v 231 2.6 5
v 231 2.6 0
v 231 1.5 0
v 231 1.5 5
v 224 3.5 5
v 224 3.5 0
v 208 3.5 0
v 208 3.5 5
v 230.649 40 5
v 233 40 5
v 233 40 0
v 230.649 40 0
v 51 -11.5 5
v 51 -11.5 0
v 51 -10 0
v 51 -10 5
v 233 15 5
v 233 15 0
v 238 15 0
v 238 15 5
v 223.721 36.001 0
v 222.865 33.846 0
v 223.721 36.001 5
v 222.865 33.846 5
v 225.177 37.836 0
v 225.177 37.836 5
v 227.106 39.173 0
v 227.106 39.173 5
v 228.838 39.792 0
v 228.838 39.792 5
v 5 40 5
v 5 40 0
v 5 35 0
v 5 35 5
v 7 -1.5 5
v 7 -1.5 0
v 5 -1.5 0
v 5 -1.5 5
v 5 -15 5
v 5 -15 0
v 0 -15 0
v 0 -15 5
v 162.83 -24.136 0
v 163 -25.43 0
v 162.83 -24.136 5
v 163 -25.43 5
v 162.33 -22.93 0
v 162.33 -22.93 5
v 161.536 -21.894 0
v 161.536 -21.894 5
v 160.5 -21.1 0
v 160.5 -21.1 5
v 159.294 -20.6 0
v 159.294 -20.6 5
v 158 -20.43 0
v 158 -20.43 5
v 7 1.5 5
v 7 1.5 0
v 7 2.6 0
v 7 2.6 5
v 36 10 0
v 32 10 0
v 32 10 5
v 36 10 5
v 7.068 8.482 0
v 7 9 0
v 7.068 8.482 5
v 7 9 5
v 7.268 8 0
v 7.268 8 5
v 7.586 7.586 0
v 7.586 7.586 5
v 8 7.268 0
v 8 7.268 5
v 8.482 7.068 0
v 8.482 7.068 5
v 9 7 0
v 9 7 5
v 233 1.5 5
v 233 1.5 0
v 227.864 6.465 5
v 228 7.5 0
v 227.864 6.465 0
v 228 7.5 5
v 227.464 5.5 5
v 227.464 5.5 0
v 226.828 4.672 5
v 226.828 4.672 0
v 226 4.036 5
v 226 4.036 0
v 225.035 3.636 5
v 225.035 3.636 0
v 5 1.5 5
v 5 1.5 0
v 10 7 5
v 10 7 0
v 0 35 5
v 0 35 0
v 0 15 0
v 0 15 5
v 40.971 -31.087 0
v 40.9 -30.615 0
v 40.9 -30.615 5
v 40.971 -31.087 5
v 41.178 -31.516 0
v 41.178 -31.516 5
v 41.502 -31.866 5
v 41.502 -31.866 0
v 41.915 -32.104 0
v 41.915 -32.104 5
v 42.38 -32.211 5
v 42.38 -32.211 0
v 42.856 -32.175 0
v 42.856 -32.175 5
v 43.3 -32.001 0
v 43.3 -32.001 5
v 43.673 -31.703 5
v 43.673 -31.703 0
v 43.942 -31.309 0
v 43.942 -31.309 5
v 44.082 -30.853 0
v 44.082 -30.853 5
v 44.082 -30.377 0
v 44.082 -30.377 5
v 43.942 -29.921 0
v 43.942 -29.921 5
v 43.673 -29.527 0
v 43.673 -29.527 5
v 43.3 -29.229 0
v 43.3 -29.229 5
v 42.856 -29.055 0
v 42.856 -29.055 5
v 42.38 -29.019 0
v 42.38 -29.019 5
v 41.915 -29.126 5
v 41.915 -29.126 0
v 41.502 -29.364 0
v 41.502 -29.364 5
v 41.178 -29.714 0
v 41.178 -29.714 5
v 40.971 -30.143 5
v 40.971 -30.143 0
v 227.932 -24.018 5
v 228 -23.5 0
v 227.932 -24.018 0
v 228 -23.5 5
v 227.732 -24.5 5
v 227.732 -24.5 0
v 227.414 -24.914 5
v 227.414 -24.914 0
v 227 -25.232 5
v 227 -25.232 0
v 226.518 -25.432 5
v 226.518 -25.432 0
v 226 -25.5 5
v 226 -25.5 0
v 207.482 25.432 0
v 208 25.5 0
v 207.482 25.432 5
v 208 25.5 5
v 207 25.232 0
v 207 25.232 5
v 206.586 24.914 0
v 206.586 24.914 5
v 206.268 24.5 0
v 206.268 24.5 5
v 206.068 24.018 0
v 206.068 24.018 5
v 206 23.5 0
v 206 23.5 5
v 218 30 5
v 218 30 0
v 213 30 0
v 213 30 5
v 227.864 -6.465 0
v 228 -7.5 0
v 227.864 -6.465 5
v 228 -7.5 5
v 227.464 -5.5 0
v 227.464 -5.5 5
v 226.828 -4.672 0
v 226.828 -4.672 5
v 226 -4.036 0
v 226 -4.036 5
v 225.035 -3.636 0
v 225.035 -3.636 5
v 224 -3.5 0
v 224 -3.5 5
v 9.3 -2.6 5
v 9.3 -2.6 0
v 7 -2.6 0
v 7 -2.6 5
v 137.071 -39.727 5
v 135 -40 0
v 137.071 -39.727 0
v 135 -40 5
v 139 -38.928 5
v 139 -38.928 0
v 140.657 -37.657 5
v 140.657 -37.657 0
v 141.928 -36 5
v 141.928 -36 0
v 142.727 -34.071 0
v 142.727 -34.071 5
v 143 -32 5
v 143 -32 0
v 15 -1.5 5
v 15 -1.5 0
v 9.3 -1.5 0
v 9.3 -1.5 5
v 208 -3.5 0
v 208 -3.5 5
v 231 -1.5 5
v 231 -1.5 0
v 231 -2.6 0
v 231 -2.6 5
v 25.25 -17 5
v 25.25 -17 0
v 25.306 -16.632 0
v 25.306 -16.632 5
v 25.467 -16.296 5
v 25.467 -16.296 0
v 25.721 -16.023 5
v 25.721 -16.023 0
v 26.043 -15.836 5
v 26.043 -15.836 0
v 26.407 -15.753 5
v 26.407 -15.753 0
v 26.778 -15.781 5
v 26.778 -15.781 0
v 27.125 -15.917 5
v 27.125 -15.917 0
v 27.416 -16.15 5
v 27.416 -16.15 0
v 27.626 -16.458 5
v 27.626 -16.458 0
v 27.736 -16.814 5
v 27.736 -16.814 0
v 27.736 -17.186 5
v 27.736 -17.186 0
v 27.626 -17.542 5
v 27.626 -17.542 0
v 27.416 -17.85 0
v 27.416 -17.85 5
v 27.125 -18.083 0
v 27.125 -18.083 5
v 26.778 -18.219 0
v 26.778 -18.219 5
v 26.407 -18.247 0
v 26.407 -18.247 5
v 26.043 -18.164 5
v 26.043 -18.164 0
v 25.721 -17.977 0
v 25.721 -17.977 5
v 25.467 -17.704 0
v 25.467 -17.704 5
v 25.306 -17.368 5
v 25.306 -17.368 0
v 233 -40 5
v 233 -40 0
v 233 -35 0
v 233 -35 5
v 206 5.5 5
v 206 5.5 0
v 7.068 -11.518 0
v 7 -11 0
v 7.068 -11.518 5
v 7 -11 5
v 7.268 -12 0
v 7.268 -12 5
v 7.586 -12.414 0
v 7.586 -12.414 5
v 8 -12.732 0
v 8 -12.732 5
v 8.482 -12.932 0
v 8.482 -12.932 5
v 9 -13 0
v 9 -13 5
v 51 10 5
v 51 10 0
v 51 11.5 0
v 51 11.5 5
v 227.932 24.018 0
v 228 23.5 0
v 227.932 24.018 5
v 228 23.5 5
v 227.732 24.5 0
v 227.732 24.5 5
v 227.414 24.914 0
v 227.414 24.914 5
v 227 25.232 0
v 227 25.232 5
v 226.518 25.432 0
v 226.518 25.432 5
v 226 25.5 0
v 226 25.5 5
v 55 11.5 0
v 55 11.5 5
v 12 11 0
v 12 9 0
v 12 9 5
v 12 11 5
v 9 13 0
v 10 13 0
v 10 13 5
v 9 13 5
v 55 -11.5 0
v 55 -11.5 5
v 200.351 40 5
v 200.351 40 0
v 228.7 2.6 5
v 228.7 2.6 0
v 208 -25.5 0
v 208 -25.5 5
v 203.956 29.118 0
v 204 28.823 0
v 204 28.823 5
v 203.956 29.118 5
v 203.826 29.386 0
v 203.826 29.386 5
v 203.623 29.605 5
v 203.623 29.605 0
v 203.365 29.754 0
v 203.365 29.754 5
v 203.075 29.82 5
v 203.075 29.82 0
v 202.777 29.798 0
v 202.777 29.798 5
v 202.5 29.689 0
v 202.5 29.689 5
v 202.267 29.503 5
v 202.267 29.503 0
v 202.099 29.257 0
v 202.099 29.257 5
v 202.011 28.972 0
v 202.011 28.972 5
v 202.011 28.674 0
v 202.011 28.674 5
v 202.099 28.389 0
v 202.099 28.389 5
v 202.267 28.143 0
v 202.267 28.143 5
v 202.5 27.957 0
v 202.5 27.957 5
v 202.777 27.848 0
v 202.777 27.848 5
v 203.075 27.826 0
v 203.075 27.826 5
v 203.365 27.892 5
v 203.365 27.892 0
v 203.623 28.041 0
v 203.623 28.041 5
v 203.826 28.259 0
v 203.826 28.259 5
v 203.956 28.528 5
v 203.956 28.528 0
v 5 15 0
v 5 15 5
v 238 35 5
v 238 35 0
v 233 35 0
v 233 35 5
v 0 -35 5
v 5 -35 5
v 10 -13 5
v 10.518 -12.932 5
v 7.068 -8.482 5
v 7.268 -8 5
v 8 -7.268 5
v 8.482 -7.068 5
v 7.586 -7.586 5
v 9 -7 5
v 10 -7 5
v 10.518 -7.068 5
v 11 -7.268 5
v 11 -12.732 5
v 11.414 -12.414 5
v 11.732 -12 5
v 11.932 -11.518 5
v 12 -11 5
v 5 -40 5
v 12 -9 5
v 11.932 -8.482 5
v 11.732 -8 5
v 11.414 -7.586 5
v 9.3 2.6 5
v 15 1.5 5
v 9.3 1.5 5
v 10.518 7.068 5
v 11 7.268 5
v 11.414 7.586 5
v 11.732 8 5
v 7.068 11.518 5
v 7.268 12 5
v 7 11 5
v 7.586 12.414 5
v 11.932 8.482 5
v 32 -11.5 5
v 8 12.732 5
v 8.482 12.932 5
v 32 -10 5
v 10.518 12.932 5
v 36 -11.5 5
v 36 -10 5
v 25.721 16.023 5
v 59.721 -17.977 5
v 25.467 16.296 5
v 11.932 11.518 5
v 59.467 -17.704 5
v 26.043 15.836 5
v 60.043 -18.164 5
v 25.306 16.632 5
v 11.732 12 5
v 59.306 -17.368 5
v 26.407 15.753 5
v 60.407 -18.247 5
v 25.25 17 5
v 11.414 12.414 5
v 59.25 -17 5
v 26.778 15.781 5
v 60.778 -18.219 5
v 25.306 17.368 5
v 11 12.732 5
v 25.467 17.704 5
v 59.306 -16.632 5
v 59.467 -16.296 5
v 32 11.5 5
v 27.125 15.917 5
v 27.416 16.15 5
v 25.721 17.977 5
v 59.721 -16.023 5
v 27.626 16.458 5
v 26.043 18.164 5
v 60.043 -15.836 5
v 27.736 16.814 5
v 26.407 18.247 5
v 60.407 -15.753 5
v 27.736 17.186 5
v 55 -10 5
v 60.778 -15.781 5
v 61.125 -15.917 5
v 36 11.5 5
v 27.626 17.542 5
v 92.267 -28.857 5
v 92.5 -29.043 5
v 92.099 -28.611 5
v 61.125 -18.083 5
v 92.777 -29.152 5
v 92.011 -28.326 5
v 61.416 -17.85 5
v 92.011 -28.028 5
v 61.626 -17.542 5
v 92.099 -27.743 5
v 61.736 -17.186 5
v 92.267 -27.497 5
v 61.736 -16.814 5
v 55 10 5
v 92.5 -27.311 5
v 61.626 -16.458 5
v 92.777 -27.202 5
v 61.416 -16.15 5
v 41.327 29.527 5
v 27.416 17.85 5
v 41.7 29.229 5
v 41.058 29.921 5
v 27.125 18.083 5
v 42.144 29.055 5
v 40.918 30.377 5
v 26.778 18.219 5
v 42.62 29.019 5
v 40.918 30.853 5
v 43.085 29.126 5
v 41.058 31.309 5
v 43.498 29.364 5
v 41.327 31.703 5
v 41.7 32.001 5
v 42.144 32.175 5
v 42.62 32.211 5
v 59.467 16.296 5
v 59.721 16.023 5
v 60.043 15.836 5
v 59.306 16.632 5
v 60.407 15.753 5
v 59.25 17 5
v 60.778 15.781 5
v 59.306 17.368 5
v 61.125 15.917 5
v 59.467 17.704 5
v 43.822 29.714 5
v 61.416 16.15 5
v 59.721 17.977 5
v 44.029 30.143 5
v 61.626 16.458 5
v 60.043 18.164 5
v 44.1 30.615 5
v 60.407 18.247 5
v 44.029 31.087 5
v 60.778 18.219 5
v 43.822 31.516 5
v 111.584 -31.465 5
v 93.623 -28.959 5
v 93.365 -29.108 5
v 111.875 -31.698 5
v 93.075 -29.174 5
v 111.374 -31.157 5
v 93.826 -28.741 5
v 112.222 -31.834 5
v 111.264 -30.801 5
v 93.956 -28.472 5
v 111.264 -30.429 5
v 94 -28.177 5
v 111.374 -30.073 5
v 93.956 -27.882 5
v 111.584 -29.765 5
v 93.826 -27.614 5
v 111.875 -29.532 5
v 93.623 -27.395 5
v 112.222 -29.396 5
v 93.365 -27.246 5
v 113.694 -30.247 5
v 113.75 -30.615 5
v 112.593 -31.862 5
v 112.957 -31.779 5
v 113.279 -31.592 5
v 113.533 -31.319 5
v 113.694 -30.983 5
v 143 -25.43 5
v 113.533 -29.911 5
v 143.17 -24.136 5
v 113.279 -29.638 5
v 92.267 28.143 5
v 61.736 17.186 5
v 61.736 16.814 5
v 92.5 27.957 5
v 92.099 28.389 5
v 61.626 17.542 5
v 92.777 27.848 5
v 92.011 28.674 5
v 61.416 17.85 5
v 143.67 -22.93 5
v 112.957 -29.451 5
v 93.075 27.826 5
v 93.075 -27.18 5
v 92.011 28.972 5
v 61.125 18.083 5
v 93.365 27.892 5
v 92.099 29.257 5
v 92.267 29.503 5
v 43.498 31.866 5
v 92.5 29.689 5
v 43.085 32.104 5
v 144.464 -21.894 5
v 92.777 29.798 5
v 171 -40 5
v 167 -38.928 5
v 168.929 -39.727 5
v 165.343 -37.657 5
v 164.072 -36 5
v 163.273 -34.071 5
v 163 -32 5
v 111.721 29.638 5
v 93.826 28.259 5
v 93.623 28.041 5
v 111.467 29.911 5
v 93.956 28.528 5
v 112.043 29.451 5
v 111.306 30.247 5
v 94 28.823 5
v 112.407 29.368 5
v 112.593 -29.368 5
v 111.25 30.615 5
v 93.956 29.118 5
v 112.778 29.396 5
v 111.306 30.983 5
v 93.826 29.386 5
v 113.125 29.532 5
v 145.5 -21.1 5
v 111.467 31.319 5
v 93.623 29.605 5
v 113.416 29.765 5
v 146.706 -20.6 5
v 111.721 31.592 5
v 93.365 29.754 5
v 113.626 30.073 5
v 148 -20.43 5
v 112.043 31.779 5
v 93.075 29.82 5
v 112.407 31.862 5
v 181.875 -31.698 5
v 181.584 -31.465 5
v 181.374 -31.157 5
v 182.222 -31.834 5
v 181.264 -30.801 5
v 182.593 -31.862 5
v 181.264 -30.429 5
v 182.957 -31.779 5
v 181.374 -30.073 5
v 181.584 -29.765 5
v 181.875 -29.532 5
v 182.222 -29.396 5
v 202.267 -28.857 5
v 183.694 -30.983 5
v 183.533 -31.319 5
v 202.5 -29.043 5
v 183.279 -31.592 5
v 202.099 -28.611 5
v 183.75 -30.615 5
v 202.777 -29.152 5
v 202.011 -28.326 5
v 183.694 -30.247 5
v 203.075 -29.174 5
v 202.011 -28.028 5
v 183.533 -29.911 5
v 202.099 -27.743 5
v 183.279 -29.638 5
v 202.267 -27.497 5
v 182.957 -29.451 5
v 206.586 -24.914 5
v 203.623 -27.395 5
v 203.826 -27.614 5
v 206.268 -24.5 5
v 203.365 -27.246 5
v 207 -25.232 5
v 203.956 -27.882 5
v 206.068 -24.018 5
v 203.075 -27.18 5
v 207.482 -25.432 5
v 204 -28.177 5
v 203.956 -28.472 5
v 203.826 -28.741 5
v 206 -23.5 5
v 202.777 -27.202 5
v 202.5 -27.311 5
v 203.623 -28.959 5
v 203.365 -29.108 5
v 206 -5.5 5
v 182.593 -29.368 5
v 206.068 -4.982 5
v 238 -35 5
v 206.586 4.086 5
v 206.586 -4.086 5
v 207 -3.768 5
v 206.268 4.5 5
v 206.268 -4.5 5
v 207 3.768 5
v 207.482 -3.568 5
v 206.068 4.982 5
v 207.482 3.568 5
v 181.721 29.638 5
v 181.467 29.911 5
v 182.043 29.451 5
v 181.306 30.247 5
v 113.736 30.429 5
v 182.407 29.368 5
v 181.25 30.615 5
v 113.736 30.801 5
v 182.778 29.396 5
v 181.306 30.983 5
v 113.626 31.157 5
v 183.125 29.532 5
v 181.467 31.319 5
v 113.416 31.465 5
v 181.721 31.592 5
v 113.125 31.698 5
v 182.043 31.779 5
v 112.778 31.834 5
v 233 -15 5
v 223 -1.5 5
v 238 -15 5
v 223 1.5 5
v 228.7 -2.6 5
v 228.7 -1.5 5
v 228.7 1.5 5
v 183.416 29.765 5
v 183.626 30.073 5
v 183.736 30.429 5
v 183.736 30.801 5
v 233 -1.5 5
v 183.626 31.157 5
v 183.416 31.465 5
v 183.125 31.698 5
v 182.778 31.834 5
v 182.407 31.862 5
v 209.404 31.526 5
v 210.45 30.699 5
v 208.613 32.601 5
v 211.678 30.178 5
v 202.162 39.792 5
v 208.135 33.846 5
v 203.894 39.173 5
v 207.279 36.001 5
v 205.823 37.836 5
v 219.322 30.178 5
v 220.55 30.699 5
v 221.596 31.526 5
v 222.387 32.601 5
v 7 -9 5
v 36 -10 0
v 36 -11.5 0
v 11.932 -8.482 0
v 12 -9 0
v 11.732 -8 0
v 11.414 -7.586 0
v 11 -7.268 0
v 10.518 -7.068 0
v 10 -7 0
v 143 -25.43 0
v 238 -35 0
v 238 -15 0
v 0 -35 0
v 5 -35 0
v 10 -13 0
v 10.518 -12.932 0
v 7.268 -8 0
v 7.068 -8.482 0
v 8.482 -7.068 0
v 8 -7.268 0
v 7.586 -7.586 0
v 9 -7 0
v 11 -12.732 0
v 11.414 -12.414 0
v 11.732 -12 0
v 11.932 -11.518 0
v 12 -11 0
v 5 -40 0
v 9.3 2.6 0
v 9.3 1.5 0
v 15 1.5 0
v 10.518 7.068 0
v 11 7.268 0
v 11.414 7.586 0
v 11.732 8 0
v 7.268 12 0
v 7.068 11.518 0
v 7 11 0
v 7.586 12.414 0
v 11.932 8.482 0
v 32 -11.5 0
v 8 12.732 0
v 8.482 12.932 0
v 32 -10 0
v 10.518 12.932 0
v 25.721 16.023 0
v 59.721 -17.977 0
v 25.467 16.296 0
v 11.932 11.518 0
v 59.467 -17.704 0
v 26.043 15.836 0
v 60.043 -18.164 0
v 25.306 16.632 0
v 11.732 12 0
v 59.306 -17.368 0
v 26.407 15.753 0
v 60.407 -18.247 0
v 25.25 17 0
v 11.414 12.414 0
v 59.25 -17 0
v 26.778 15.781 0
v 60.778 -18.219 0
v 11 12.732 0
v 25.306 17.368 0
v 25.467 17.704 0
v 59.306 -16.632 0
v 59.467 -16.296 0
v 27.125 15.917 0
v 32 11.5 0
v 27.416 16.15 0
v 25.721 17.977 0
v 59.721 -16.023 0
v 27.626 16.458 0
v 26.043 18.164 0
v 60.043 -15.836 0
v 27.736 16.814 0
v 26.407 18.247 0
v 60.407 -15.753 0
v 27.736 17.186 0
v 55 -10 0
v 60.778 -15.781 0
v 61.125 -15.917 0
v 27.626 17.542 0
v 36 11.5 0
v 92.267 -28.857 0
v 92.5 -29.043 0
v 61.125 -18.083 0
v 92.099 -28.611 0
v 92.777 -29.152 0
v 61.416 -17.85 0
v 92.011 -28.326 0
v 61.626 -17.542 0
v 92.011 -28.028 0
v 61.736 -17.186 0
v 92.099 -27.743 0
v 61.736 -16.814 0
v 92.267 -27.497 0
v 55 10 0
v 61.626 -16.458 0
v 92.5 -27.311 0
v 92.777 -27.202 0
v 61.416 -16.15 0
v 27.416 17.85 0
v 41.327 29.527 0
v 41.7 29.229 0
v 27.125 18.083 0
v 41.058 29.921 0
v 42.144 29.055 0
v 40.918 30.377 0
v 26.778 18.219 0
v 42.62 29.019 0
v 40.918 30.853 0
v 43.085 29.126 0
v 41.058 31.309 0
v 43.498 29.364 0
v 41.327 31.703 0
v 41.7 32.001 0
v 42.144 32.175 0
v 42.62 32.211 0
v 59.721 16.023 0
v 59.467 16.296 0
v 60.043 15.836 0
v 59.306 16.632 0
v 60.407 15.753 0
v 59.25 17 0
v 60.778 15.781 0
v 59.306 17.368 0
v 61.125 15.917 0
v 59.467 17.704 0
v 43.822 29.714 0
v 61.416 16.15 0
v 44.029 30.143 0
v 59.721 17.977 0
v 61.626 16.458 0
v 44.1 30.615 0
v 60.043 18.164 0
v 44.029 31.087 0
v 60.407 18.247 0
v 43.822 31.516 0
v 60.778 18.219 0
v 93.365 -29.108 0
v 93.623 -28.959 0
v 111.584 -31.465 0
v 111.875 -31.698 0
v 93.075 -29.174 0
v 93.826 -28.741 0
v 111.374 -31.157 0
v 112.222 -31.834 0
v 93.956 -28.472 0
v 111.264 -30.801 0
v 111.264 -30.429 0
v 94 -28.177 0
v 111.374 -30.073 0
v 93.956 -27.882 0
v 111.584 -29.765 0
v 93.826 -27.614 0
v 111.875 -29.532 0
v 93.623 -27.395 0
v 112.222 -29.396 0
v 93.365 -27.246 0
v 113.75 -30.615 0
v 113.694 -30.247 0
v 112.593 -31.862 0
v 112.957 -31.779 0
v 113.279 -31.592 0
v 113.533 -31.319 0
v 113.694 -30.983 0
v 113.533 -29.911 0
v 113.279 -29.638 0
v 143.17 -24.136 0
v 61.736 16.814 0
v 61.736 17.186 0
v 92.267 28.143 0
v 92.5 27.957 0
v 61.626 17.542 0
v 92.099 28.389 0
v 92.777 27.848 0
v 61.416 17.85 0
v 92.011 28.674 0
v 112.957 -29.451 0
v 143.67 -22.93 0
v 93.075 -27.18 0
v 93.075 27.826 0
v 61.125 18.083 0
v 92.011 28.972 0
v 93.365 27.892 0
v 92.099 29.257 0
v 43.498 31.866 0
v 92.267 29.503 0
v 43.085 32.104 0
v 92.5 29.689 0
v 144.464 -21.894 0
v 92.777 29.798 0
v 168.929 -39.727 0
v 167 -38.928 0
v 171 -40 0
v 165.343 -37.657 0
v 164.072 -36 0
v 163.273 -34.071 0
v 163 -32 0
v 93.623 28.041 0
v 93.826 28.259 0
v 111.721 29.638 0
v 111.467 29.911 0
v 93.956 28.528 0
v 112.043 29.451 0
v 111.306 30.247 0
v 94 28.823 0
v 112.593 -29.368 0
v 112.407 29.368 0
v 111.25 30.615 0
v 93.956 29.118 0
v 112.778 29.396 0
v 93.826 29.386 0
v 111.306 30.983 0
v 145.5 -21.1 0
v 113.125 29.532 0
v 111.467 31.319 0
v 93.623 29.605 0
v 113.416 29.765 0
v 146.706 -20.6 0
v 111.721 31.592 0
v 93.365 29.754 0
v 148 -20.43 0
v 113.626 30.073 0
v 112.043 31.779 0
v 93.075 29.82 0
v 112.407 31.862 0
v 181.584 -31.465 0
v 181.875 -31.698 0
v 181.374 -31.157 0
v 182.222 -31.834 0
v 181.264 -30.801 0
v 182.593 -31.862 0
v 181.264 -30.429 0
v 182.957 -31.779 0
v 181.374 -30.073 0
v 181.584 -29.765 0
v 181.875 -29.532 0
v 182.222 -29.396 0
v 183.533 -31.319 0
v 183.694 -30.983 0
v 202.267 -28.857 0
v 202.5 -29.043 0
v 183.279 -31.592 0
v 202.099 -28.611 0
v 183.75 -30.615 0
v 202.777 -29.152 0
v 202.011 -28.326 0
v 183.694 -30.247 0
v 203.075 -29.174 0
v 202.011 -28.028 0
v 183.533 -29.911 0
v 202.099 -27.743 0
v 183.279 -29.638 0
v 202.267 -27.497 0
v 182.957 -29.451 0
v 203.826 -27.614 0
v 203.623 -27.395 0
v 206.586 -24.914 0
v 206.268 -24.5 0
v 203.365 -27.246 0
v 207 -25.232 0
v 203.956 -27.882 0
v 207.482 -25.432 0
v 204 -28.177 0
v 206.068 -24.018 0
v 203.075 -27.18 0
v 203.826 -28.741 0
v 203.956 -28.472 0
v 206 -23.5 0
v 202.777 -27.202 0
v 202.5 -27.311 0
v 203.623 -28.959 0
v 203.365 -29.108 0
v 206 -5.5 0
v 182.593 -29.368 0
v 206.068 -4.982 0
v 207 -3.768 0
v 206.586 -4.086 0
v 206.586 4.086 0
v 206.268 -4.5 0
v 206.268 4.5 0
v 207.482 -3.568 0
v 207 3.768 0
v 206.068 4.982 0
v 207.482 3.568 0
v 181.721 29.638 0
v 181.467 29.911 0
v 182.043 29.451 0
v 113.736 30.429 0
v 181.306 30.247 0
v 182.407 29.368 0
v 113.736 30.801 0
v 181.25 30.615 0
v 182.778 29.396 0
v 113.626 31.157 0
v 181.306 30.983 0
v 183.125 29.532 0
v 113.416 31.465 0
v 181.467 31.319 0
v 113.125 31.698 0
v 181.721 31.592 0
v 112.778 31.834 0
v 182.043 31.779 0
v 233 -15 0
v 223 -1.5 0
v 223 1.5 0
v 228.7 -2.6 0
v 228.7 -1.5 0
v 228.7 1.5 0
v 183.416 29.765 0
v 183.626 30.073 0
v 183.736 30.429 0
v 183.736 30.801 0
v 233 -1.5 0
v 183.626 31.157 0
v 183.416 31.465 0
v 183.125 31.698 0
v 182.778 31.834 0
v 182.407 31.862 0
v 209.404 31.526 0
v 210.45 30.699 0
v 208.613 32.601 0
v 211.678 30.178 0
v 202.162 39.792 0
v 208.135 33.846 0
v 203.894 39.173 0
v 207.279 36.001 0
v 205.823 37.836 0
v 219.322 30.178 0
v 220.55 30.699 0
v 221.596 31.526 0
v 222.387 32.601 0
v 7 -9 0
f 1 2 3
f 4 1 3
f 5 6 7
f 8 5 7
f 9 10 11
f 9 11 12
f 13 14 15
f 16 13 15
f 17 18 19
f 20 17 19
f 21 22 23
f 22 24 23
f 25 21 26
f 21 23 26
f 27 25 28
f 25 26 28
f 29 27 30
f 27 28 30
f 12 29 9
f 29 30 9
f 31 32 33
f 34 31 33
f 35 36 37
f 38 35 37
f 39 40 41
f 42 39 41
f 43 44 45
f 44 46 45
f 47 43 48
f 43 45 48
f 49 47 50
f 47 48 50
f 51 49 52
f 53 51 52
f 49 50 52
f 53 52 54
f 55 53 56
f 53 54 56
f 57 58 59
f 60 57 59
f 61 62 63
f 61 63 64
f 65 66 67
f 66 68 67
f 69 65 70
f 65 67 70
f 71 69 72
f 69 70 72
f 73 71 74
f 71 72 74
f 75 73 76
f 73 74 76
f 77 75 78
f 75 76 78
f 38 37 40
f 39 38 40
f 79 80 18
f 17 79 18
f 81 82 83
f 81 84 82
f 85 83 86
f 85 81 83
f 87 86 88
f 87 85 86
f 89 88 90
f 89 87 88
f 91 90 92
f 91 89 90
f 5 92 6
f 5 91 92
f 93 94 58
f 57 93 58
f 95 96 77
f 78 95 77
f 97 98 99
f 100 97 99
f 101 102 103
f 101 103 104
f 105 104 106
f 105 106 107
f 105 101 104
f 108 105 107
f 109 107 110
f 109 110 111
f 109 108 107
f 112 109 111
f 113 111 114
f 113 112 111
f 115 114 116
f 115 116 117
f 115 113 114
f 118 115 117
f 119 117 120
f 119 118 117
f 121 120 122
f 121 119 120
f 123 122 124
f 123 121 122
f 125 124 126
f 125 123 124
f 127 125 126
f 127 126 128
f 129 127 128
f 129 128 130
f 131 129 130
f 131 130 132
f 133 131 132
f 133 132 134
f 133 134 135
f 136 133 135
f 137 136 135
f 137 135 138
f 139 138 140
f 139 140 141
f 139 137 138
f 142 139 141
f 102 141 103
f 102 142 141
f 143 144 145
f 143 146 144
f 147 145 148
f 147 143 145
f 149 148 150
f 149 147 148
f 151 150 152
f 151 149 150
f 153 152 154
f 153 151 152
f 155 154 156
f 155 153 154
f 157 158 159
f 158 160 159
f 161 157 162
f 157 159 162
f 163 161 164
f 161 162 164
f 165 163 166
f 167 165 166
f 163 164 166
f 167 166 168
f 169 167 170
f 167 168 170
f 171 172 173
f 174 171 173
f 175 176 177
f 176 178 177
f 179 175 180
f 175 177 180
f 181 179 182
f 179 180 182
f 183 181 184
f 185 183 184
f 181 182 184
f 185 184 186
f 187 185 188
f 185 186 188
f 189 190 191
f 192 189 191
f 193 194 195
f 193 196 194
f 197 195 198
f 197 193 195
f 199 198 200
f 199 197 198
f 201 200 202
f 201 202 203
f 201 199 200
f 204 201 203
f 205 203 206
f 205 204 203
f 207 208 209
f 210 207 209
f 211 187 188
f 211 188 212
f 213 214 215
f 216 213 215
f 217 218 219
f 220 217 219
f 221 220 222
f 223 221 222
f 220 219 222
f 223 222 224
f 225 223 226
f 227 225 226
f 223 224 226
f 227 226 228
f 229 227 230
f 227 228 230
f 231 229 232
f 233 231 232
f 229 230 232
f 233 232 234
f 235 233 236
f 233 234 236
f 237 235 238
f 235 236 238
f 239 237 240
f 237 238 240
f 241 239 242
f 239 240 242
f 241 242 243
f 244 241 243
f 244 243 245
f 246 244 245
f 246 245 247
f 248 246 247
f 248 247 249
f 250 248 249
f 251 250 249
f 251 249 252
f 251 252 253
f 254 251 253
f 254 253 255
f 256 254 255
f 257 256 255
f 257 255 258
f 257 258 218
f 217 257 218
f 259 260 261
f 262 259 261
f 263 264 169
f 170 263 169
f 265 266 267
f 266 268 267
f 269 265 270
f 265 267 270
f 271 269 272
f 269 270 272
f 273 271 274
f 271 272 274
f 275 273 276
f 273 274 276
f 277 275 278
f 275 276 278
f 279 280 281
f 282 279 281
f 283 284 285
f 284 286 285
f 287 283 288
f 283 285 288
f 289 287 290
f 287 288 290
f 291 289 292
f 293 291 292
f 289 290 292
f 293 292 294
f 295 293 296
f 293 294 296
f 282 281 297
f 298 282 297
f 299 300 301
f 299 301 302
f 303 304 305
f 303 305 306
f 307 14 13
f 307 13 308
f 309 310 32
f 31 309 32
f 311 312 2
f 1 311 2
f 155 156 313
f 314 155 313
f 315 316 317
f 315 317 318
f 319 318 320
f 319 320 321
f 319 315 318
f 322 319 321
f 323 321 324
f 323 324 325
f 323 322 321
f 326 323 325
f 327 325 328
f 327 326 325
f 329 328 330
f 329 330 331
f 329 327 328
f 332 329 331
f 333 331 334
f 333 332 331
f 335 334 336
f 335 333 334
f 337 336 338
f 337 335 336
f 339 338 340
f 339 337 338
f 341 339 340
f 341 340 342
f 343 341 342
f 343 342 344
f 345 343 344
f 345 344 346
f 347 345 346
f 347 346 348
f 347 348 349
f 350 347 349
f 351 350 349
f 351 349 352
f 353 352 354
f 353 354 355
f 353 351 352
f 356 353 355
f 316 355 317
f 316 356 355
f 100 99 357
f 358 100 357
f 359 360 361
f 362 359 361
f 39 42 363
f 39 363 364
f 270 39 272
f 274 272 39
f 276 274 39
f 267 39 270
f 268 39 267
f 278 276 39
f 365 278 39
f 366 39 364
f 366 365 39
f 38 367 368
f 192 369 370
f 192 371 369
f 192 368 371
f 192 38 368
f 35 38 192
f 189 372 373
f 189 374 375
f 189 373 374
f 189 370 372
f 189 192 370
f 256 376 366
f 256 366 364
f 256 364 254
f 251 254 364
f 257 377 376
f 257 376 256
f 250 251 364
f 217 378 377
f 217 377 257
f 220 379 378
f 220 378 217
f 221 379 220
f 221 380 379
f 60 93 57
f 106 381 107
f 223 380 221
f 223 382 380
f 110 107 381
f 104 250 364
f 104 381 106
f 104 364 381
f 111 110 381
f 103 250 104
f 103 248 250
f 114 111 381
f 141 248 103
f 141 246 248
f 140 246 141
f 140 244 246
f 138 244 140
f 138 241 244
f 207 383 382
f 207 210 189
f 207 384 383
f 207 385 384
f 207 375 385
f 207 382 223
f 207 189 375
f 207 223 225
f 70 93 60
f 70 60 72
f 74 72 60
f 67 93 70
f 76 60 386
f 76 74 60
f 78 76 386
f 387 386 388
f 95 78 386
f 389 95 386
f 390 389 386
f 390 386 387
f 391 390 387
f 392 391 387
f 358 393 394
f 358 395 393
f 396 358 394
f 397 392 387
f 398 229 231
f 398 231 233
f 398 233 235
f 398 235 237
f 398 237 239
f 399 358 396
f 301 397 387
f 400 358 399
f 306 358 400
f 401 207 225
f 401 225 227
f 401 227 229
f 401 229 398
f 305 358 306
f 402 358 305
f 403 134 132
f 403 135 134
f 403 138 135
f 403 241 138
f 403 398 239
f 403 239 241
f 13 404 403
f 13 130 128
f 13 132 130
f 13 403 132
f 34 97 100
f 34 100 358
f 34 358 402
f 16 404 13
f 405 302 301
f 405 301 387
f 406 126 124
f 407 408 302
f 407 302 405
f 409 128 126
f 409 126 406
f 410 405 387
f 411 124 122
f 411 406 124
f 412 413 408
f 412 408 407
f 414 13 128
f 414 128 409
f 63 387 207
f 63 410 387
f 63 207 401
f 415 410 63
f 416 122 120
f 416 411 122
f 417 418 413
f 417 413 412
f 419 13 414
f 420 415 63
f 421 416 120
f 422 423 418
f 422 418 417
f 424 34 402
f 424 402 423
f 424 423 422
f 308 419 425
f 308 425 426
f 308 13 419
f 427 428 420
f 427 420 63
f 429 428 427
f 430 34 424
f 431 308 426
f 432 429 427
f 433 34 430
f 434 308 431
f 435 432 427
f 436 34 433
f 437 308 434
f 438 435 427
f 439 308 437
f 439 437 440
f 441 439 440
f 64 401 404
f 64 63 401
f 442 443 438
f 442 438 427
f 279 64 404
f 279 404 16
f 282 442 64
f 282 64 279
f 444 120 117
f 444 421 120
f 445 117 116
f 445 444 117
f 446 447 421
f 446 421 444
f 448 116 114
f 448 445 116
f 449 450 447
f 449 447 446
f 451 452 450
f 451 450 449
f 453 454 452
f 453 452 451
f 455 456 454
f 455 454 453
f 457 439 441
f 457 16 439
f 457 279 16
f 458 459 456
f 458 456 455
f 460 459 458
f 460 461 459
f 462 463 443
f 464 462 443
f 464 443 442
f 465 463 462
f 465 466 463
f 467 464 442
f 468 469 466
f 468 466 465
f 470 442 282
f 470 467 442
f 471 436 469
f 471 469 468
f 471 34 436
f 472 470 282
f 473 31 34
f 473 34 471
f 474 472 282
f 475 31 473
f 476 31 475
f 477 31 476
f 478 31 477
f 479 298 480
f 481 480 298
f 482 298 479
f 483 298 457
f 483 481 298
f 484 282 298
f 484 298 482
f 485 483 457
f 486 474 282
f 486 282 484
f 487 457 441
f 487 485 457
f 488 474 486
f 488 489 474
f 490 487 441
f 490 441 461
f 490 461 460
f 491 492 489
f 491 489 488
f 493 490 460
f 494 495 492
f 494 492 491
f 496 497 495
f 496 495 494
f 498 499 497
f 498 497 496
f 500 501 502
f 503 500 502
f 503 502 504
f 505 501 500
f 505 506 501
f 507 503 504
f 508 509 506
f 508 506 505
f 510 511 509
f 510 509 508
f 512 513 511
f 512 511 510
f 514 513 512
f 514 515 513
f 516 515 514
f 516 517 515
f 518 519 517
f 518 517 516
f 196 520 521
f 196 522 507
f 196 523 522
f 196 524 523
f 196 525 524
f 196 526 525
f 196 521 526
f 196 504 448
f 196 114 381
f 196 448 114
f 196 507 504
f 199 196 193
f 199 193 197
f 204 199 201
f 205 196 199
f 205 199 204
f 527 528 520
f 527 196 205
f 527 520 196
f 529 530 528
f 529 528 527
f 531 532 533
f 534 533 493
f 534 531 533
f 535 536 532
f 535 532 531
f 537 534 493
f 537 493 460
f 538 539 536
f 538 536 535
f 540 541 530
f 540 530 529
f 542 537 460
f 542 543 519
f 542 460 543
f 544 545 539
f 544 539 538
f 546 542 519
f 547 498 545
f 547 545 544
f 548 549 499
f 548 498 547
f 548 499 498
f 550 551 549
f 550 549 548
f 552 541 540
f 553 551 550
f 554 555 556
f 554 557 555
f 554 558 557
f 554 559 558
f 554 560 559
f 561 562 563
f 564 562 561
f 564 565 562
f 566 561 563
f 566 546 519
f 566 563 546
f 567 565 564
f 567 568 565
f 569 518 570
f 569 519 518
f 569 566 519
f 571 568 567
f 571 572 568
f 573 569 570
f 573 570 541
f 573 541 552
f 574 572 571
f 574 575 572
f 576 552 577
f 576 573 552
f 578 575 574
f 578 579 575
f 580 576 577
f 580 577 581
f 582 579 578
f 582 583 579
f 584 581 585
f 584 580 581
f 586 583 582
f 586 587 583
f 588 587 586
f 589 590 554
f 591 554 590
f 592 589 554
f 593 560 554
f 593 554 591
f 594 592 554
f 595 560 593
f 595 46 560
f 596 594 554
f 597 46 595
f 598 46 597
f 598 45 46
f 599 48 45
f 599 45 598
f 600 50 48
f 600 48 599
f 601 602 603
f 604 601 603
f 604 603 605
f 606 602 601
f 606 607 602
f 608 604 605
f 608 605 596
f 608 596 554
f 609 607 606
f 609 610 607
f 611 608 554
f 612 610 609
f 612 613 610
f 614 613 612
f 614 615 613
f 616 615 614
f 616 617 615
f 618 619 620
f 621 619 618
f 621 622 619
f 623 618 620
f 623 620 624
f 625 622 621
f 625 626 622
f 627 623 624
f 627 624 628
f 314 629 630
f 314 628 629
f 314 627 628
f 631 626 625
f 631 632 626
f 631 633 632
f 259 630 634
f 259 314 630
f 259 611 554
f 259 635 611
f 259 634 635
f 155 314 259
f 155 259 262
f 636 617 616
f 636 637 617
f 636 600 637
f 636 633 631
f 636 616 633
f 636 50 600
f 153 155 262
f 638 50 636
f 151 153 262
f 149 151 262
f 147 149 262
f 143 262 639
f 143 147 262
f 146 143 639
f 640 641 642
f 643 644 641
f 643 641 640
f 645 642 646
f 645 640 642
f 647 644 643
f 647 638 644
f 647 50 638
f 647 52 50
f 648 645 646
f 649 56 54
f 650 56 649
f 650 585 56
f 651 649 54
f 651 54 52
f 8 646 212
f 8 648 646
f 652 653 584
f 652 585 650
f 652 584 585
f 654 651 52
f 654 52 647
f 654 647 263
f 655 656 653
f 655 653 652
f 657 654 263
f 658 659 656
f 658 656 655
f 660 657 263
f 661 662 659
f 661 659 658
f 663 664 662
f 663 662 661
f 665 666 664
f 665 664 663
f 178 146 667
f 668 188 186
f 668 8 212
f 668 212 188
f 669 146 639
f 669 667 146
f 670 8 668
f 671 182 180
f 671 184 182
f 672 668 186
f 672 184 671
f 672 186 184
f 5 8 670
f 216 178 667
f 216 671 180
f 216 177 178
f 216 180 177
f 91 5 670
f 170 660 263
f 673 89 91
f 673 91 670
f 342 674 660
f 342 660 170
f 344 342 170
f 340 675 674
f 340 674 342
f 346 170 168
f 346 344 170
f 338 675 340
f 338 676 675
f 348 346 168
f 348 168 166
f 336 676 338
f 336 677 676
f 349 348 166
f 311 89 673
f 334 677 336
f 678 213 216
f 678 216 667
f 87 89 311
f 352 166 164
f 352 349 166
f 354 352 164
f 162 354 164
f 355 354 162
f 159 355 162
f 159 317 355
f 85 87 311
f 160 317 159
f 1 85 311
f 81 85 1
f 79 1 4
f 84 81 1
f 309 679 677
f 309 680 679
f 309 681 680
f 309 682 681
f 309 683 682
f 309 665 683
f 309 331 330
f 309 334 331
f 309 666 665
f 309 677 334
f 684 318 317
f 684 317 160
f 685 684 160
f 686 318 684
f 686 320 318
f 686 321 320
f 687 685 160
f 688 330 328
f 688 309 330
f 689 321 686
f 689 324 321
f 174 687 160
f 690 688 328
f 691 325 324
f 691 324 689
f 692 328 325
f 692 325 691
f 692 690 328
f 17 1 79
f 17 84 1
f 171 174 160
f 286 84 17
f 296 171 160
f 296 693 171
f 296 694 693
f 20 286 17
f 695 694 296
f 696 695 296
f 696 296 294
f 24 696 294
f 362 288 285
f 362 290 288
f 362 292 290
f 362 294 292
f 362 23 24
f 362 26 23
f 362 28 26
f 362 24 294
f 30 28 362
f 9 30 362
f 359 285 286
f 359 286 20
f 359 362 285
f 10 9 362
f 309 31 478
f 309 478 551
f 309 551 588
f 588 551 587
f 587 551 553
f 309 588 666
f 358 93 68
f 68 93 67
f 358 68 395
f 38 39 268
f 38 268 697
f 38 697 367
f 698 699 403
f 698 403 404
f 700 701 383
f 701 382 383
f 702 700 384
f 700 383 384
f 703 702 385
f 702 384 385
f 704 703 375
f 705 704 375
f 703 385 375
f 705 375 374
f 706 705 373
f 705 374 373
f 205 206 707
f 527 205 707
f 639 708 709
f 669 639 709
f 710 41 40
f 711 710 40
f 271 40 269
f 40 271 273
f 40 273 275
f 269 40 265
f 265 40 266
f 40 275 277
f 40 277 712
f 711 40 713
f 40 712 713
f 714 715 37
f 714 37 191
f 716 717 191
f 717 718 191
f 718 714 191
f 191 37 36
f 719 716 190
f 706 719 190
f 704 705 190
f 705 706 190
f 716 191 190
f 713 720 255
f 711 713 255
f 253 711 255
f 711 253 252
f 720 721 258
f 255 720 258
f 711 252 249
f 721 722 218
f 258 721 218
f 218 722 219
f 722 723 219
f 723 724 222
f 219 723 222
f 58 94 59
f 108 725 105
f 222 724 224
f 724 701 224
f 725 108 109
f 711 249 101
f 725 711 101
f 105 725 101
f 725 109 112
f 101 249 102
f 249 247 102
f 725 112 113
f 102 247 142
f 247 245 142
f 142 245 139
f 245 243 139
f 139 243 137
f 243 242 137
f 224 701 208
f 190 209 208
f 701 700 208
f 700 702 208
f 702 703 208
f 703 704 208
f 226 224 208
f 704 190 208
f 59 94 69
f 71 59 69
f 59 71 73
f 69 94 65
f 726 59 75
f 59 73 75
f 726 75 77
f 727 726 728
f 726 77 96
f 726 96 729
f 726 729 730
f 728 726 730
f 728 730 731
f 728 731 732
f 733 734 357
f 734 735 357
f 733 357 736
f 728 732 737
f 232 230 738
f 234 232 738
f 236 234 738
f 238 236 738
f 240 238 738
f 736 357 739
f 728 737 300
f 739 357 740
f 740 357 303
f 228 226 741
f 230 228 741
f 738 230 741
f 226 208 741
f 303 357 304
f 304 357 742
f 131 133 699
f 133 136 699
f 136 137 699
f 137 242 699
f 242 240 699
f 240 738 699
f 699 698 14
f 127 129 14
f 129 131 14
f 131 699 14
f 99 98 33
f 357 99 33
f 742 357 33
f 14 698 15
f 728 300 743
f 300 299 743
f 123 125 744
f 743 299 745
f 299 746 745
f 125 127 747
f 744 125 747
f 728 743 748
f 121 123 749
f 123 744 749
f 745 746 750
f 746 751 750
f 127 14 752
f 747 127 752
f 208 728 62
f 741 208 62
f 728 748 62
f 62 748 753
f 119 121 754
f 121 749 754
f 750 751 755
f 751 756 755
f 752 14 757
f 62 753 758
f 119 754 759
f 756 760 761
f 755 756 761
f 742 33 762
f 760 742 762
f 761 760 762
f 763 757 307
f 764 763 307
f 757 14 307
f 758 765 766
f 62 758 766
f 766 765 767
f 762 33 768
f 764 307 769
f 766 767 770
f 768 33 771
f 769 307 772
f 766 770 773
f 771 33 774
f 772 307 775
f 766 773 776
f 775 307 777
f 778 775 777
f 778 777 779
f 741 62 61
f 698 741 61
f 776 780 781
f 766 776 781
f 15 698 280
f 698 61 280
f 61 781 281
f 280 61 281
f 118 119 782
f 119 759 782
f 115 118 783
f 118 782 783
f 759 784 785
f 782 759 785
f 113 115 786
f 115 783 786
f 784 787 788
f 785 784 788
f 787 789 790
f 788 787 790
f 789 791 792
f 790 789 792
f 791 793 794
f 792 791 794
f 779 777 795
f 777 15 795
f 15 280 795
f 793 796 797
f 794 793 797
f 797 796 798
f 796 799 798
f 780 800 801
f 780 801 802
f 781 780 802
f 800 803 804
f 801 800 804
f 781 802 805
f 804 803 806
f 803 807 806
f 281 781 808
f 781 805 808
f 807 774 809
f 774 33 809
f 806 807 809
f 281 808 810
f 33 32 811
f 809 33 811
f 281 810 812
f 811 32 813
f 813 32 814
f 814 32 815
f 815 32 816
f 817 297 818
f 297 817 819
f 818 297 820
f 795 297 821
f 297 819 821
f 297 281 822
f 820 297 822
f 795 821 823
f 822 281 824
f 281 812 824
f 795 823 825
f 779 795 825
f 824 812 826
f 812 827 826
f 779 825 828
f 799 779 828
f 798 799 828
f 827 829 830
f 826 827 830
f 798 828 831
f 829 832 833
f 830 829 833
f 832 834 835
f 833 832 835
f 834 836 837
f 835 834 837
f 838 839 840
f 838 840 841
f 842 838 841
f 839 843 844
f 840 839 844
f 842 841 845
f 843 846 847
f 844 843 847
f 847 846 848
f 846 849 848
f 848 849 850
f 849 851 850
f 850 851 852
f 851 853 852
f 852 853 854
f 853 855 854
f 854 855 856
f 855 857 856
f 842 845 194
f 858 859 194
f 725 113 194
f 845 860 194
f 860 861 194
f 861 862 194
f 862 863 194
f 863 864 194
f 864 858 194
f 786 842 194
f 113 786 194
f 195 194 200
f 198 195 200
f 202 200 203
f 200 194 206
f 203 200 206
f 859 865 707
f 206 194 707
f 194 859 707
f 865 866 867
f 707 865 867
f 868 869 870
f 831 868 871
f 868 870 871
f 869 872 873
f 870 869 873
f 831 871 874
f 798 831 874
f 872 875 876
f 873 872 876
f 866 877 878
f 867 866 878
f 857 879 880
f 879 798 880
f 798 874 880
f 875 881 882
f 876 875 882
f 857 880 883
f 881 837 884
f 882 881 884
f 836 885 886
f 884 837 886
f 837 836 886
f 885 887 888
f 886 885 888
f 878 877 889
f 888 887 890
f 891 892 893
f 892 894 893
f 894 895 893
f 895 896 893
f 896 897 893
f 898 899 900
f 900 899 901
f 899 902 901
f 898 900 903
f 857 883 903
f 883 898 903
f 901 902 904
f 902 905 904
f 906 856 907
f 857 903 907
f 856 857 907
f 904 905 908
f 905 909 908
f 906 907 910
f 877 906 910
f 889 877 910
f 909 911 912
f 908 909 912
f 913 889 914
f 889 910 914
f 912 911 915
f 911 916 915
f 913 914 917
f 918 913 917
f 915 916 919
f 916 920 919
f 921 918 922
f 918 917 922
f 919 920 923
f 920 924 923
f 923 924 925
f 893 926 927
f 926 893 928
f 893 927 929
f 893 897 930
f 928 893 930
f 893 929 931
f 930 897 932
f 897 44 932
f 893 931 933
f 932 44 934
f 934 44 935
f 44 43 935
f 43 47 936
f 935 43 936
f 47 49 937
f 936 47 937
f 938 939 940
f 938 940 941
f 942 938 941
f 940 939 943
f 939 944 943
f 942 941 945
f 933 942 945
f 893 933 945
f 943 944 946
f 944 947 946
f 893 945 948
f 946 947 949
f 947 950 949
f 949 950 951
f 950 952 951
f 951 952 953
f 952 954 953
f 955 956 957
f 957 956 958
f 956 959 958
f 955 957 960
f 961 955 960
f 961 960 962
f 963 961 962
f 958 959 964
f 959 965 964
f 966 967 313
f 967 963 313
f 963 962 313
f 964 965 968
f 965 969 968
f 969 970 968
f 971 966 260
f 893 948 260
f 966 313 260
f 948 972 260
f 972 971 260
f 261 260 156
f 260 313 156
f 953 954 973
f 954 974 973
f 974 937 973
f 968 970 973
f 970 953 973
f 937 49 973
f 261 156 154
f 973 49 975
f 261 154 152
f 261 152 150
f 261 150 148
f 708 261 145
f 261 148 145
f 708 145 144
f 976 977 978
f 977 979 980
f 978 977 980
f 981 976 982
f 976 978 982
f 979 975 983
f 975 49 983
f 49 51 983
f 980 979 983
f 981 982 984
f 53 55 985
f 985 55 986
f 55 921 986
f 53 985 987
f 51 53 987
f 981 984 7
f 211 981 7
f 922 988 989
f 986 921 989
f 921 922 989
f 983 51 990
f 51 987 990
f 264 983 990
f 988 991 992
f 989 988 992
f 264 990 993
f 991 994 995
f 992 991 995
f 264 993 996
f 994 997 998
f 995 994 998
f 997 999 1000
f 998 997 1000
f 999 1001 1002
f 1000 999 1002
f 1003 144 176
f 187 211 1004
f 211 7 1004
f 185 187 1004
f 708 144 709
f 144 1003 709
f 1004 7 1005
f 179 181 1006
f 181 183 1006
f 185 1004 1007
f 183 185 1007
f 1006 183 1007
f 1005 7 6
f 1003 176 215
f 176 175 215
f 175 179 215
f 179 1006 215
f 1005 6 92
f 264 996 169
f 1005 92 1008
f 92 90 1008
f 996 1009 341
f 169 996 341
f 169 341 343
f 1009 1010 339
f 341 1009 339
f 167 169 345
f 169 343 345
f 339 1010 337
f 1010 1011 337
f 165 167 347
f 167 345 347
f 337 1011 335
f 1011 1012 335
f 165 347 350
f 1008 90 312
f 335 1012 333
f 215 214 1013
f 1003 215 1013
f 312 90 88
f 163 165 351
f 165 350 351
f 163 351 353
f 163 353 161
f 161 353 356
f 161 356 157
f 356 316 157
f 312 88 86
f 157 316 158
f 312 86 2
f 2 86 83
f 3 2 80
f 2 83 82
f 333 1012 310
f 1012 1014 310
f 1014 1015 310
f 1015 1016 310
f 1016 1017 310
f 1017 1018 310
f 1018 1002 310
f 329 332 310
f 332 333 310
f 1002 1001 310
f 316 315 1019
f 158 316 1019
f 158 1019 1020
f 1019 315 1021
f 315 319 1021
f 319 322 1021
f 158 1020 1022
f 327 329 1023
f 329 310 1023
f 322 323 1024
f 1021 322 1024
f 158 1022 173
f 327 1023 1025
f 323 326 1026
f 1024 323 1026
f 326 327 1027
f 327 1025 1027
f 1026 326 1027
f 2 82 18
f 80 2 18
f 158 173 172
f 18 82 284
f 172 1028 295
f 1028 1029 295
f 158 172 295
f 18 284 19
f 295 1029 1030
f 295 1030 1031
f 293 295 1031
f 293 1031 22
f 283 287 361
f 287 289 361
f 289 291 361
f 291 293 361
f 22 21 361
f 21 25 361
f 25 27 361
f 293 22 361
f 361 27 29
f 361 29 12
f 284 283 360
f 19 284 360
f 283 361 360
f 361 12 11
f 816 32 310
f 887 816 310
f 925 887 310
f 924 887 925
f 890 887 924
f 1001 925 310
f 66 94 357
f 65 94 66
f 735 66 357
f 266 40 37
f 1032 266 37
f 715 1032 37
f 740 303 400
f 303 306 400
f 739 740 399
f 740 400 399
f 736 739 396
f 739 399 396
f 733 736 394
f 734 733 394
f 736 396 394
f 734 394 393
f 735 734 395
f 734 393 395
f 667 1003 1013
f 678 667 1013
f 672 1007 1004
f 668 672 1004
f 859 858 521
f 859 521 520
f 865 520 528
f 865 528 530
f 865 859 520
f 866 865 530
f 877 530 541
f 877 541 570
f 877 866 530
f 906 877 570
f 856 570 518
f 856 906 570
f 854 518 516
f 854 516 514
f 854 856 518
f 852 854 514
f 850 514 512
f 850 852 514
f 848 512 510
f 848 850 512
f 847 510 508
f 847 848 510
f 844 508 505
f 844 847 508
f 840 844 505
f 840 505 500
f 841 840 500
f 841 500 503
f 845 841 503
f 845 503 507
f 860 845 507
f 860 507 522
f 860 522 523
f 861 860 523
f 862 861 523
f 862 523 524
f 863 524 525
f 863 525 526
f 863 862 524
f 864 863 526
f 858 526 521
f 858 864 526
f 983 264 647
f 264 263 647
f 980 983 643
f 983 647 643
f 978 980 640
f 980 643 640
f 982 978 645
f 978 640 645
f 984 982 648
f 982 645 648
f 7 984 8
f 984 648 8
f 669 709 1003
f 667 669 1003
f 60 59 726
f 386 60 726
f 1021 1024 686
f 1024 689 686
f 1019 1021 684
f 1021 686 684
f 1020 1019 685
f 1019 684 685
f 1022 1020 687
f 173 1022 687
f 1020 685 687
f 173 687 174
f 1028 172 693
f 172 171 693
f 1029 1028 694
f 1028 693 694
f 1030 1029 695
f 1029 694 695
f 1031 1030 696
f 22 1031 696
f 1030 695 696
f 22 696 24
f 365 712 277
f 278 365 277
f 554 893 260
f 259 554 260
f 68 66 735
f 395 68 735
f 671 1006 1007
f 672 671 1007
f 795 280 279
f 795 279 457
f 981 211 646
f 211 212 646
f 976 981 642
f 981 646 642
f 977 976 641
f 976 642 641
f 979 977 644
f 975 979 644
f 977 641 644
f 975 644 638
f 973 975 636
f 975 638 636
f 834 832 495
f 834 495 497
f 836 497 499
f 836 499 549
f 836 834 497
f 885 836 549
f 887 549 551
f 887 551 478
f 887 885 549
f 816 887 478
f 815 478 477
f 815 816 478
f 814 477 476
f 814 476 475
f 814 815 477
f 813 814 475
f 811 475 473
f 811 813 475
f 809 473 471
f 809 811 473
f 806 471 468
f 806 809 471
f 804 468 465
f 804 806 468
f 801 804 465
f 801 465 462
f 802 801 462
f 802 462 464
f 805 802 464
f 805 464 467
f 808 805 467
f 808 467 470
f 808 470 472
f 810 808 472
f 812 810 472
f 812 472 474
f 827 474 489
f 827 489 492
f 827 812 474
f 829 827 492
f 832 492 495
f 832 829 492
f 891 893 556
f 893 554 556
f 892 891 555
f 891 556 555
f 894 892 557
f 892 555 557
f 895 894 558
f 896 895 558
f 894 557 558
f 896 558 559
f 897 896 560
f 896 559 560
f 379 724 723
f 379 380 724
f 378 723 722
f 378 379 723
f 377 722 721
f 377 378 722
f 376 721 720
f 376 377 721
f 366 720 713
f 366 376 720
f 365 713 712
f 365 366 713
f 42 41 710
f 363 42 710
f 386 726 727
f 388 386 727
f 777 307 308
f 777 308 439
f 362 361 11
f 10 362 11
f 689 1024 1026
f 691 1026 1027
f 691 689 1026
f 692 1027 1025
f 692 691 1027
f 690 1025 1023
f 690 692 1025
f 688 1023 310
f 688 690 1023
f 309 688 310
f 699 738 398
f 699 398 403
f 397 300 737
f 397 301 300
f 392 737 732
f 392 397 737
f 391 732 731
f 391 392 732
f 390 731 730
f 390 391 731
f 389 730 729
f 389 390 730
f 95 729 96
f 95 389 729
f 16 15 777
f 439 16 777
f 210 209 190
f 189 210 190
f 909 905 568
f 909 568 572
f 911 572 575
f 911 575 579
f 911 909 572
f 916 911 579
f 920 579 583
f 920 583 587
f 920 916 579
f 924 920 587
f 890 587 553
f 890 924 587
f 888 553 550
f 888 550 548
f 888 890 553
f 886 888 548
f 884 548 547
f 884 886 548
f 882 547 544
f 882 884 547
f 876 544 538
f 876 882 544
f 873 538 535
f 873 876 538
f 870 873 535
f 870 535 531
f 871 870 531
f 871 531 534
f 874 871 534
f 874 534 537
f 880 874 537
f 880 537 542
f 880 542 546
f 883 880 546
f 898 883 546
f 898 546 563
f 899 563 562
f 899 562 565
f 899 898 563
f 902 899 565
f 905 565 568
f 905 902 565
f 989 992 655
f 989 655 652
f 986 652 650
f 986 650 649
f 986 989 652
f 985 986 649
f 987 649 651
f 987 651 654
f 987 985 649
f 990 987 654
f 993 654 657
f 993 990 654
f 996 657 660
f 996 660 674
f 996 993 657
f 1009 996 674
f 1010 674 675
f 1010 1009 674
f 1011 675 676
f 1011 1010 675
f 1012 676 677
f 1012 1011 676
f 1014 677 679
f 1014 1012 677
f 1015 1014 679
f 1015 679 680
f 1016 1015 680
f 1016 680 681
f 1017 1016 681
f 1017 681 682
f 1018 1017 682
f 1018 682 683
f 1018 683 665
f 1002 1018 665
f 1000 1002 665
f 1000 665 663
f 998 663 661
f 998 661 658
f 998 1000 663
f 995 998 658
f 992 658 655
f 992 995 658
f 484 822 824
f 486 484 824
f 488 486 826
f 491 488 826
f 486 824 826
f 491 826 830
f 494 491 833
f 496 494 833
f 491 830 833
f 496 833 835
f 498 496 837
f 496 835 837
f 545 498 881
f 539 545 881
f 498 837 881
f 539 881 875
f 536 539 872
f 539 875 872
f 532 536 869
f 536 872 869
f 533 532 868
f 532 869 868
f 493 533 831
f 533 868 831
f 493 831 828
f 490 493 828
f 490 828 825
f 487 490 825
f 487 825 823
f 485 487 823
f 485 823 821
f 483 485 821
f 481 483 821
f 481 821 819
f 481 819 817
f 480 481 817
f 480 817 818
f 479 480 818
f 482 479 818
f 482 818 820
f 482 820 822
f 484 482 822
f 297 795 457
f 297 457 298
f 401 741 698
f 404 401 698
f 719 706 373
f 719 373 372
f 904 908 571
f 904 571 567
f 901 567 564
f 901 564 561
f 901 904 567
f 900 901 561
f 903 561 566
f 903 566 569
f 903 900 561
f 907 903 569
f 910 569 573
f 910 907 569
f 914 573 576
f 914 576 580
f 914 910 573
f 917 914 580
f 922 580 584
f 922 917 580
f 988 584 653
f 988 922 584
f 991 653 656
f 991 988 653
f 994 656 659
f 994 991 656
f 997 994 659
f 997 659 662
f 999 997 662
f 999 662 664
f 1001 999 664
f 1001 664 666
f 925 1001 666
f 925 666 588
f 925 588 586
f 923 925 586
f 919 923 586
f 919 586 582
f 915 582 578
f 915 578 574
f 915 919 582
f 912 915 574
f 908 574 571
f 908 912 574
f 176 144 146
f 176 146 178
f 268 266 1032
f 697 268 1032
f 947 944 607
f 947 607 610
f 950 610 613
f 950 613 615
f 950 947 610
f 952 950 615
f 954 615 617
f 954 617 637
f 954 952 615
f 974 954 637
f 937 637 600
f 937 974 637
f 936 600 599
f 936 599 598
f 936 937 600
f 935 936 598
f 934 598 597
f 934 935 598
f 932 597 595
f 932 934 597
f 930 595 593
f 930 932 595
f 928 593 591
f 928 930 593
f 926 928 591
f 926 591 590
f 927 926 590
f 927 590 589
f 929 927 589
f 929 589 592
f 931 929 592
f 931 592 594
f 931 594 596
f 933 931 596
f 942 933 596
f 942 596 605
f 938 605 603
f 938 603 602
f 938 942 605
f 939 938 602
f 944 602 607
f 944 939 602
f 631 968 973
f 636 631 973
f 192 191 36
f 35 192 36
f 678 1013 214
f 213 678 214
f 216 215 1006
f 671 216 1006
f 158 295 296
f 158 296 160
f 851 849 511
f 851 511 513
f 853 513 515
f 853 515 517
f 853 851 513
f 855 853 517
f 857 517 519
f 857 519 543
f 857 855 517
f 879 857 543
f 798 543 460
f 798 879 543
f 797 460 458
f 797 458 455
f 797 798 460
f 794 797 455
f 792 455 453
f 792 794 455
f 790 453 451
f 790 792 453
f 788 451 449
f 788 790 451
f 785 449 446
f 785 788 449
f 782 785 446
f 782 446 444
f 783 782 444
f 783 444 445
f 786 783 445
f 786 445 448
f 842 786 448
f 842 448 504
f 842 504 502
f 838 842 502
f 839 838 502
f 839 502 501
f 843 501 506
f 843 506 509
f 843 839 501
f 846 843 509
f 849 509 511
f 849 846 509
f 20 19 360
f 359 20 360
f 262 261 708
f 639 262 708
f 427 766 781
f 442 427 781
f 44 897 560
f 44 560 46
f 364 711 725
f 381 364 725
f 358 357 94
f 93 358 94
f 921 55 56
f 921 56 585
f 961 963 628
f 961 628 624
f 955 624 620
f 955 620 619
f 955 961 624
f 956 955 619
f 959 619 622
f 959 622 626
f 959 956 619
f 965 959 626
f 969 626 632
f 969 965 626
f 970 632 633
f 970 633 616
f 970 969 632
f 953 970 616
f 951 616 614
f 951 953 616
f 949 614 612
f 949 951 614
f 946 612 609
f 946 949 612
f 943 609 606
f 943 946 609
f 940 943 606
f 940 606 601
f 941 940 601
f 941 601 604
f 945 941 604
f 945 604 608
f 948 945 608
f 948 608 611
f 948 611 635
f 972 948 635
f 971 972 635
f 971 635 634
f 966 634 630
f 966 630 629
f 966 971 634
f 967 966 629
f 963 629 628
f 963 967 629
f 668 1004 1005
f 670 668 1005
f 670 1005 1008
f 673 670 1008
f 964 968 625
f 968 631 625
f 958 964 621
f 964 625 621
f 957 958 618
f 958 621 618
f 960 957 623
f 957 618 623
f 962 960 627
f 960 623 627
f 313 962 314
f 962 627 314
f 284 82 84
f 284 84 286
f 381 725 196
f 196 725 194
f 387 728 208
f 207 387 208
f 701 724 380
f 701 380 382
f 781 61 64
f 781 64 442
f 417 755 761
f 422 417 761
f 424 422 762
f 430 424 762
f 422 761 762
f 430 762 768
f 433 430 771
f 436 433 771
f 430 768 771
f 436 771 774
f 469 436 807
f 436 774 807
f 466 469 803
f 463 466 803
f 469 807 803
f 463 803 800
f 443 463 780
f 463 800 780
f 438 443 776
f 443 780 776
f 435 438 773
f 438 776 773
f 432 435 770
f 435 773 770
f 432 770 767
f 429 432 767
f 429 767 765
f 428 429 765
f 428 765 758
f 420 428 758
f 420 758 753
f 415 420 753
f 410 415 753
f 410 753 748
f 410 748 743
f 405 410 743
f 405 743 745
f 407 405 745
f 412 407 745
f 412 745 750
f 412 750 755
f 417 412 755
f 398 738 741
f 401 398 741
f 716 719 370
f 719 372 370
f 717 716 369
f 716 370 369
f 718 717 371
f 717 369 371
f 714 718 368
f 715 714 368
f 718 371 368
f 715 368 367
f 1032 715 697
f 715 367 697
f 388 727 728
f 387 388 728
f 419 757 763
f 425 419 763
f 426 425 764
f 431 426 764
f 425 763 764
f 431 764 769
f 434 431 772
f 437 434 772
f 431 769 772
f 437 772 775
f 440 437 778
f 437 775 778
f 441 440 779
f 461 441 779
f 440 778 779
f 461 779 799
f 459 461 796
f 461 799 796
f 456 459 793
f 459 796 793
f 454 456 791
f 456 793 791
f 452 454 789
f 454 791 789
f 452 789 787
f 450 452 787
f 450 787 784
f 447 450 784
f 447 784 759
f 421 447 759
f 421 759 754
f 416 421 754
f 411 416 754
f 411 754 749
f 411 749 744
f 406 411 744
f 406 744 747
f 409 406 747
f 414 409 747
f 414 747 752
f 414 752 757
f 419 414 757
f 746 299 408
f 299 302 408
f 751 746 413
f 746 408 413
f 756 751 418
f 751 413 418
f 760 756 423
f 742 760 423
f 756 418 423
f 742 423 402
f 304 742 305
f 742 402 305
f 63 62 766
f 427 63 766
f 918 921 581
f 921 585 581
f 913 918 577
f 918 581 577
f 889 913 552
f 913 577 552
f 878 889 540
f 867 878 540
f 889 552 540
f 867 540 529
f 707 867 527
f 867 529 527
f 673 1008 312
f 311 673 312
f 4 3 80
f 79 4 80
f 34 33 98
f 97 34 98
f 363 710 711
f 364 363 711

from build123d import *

# Parameters (mm, degrees)
ESQUISSE1_R        = 1
ESQUISSE1_R_2      = 1.25
ESQUISSE1_R_3      = 1.6
ESQUISSE1_W        = 4
ESQUISSE1_H        = 1.5
BOSS_EXTRU_1_DEPTH = 5
SKETCH1_R          = 1.25
SKETCH1_W          = 15
SKETCH1_H          = 10
SKETCH1_W_2        = 5
SKETCH1_H_2        = 6
SKETCH1_W_3        = 20
SKETCH1_H_3        = 20
SKETCH1_W_4        = 22
SKETCH1_H_4        = 22
CUT_EXTRUDE1_DEPTH = 10
FILLET2_R          = 5
FILLET3_R          = 2
CONG_1_R           = 8
CONG_2_R           = 2
CONG_3_R           = 4


with BuildPart() as part:
    # Esquisse1 → Boss.-Extru.1 (new body)
    with BuildSketch(Plane.XY):
        Polygon((0, 35), (0, 15), (5, 15), (5, 1.5), (7, 1.5), (7, 2.6), (9.3, 2.6), (9.3, 1.5), (15, 1.5), (15, -1.5), (9.3, -1.5), (9.3, -2.6), (7, -2.6), (7, -1.5), (5, -1.5), (5, -15), (0, -15), (0, -35), (5, -35), (5, -40), (233, -40), (233, -35), (238, -35), (238, -15), (233, -15), (233, -1.5), (231, -1.5), (231, -2.6), (228.7, -2.6), (228.7, -1.5), (223, -1.5), (223, 1.5), (228.7, 1.5), (228.7, 2.6), (231, 2.6), (231, 1.5), (233, 1.5), (233, 15), (238, 15), (238, 35), (233, 35), (233, 40), (5, 40), (5, 35), align=None)
        with Locations((203, -28.177197641)):
            Circle(ESQUISSE1_R, mode=Mode.SUBTRACT)
        with Locations((203, 28.822802359)):
            Circle(ESQUISSE1_R, mode=Mode.SUBTRACT)
        with Locations((93, -28.177197641)):
            Circle(ESQUISSE1_R, mode=Mode.SUBTRACT)
        with Locations((93, 28.822802359)):
            Circle(ESQUISSE1_R, mode=Mode.SUBTRACT)
        with Locations((112.5, -30.615)):
            Circle(ESQUISSE1_R_2, mode=Mode.SUBTRACT)
        with Locations(Location((42.5, -30.615, 0), (0, 0, 180))):
            Circle(ESQUISSE1_R_3, mode=Mode.SUBTRACT)
        with Locations((182.5, -30.615)):
            Circle(ESQUISSE1_R_2, mode=Mode.SUBTRACT)
        with Locations((42.5, 30.615)):
            Circle(ESQUISSE1_R_3, mode=Mode.SUBTRACT)
        with Locations(Location((182.5, 30.615, 0), (0, 0, 180))):
            Circle(ESQUISSE1_R_2, mode=Mode.SUBTRACT)
        with Locations(Location((112.5, 30.615, 0), (0, 0, 180))):
            Circle(ESQUISSE1_R_2, mode=Mode.SUBTRACT)
        with Locations((34, -10.75)):
            Rectangle(ESQUISSE1_W, ESQUISSE1_H, mode=Mode.SUBTRACT)
        with Locations((34, 10.75)):
            Rectangle(ESQUISSE1_W, ESQUISSE1_H, mode=Mode.SUBTRACT)
        with Locations((53, 10.75)):
            Rectangle(ESQUISSE1_W, ESQUISSE1_H, mode=Mode.SUBTRACT)
        with Locations((53, -10.75)):
            Rectangle(ESQUISSE1_W, ESQUISSE1_H, mode=Mode.SUBTRACT)
    extrude(amount=BOSS_EXTRU_1_DEPTH)

    # Sketch1 → Cut-Extrude1 (cut)
    with BuildSketch(Plane(origin=(0, 0, 0), x_dir=(-1, 0, 0), z_dir=(0, 0, -1))):
        with Locations((-60.5, 17)):
            Circle(SKETCH1_R)
        with Locations((-60.5, -17)):
            Circle(SKETCH1_R)
        with Locations((-26.5, 17)):
            Circle(SKETCH1_R)
        with Locations((-26.5, -17)):
            Circle(SKETCH1_R)
        with Locations((-215.5, 35)):
            Rectangle(SKETCH1_W, SKETCH1_H)
        with Locations((-9.5, 10)):
            Rectangle(SKETCH1_W_2, SKETCH1_H_2)
        with Locations((-153, -30.429903646)):
            Rectangle(SKETCH1_W_3, SKETCH1_H_3)
        with Locations((-9.5, -10)):
            Rectangle(SKETCH1_W_2, SKETCH1_H_2)
        with Locations((-217, 14.5)):
            Rectangle(SKETCH1_W_4, SKETCH1_H_4)
        with Locations((-217, -14.5)):
            Rectangle(SKETCH1_W_4, SKETCH1_H_4)
    extrude(amount=-CUT_EXTRUDE1_DEPTH, mode=Mode.SUBTRACT)

    # Fillet2
    fillet2_edges = [part.edges().sort_by_distance(p)[0] for p in [
        (208, 30, 2.5),
        (223, 30, 2.5),
        (163, -20.429903646, 2.5),
        (143, -20.429903646, 2.5),
    ]]
    fillet(fillet2_edges, radius=FILLET2_R)

    # Fillet3
    fillet3_edges = [part.edges().sort_by_distance(p)[0] for p in [
        (228, -25.5, 2.5),
        (206, -3.5, 2.5),
        (206, -25.5, 2.5),
        (228, 25.5, 2.5),
        (206, 25.5, 2.5),
        (206, 3.5, 2.5),
    ]]
    fillet(fillet3_edges, radius=FILLET3_R)

    # Congé1
    cong_1_edges = [part.edges().sort_by_distance(p)[0] for p in [
        (223, 40, 2.5),
        (208, 40, 2.5),
        (163, -40, 2.5),
        (143, -40, 2.5),
    ]]
    fillet(cong_1_edges, radius=CONG_1_R)

    # Congé2
    cong_2_edges = [part.edges().sort_by_distance(p)[0] for p in [
        (12, 7, 2.5),
        (12, 13, 2.5),
        (7, 13, 2.5),
        (7, 7, 2.5),
        (7, -13, 2.5),
        (12, -13, 2.5),
        (12, -7, 2.5),
        (7, -7, 2.5),
    ]]
    fillet(cong_2_edges, radius=CONG_2_R)

    # Congé3
    cong_3_edges = [part.edges().sort_by_distance(p)[0] for p in [
        (228, -3.5, 2.5),
        (228, 3.5, 2.5),
    ]]
    fillet(cong_3_edges, radius=CONG_3_R)


solid = part.part
